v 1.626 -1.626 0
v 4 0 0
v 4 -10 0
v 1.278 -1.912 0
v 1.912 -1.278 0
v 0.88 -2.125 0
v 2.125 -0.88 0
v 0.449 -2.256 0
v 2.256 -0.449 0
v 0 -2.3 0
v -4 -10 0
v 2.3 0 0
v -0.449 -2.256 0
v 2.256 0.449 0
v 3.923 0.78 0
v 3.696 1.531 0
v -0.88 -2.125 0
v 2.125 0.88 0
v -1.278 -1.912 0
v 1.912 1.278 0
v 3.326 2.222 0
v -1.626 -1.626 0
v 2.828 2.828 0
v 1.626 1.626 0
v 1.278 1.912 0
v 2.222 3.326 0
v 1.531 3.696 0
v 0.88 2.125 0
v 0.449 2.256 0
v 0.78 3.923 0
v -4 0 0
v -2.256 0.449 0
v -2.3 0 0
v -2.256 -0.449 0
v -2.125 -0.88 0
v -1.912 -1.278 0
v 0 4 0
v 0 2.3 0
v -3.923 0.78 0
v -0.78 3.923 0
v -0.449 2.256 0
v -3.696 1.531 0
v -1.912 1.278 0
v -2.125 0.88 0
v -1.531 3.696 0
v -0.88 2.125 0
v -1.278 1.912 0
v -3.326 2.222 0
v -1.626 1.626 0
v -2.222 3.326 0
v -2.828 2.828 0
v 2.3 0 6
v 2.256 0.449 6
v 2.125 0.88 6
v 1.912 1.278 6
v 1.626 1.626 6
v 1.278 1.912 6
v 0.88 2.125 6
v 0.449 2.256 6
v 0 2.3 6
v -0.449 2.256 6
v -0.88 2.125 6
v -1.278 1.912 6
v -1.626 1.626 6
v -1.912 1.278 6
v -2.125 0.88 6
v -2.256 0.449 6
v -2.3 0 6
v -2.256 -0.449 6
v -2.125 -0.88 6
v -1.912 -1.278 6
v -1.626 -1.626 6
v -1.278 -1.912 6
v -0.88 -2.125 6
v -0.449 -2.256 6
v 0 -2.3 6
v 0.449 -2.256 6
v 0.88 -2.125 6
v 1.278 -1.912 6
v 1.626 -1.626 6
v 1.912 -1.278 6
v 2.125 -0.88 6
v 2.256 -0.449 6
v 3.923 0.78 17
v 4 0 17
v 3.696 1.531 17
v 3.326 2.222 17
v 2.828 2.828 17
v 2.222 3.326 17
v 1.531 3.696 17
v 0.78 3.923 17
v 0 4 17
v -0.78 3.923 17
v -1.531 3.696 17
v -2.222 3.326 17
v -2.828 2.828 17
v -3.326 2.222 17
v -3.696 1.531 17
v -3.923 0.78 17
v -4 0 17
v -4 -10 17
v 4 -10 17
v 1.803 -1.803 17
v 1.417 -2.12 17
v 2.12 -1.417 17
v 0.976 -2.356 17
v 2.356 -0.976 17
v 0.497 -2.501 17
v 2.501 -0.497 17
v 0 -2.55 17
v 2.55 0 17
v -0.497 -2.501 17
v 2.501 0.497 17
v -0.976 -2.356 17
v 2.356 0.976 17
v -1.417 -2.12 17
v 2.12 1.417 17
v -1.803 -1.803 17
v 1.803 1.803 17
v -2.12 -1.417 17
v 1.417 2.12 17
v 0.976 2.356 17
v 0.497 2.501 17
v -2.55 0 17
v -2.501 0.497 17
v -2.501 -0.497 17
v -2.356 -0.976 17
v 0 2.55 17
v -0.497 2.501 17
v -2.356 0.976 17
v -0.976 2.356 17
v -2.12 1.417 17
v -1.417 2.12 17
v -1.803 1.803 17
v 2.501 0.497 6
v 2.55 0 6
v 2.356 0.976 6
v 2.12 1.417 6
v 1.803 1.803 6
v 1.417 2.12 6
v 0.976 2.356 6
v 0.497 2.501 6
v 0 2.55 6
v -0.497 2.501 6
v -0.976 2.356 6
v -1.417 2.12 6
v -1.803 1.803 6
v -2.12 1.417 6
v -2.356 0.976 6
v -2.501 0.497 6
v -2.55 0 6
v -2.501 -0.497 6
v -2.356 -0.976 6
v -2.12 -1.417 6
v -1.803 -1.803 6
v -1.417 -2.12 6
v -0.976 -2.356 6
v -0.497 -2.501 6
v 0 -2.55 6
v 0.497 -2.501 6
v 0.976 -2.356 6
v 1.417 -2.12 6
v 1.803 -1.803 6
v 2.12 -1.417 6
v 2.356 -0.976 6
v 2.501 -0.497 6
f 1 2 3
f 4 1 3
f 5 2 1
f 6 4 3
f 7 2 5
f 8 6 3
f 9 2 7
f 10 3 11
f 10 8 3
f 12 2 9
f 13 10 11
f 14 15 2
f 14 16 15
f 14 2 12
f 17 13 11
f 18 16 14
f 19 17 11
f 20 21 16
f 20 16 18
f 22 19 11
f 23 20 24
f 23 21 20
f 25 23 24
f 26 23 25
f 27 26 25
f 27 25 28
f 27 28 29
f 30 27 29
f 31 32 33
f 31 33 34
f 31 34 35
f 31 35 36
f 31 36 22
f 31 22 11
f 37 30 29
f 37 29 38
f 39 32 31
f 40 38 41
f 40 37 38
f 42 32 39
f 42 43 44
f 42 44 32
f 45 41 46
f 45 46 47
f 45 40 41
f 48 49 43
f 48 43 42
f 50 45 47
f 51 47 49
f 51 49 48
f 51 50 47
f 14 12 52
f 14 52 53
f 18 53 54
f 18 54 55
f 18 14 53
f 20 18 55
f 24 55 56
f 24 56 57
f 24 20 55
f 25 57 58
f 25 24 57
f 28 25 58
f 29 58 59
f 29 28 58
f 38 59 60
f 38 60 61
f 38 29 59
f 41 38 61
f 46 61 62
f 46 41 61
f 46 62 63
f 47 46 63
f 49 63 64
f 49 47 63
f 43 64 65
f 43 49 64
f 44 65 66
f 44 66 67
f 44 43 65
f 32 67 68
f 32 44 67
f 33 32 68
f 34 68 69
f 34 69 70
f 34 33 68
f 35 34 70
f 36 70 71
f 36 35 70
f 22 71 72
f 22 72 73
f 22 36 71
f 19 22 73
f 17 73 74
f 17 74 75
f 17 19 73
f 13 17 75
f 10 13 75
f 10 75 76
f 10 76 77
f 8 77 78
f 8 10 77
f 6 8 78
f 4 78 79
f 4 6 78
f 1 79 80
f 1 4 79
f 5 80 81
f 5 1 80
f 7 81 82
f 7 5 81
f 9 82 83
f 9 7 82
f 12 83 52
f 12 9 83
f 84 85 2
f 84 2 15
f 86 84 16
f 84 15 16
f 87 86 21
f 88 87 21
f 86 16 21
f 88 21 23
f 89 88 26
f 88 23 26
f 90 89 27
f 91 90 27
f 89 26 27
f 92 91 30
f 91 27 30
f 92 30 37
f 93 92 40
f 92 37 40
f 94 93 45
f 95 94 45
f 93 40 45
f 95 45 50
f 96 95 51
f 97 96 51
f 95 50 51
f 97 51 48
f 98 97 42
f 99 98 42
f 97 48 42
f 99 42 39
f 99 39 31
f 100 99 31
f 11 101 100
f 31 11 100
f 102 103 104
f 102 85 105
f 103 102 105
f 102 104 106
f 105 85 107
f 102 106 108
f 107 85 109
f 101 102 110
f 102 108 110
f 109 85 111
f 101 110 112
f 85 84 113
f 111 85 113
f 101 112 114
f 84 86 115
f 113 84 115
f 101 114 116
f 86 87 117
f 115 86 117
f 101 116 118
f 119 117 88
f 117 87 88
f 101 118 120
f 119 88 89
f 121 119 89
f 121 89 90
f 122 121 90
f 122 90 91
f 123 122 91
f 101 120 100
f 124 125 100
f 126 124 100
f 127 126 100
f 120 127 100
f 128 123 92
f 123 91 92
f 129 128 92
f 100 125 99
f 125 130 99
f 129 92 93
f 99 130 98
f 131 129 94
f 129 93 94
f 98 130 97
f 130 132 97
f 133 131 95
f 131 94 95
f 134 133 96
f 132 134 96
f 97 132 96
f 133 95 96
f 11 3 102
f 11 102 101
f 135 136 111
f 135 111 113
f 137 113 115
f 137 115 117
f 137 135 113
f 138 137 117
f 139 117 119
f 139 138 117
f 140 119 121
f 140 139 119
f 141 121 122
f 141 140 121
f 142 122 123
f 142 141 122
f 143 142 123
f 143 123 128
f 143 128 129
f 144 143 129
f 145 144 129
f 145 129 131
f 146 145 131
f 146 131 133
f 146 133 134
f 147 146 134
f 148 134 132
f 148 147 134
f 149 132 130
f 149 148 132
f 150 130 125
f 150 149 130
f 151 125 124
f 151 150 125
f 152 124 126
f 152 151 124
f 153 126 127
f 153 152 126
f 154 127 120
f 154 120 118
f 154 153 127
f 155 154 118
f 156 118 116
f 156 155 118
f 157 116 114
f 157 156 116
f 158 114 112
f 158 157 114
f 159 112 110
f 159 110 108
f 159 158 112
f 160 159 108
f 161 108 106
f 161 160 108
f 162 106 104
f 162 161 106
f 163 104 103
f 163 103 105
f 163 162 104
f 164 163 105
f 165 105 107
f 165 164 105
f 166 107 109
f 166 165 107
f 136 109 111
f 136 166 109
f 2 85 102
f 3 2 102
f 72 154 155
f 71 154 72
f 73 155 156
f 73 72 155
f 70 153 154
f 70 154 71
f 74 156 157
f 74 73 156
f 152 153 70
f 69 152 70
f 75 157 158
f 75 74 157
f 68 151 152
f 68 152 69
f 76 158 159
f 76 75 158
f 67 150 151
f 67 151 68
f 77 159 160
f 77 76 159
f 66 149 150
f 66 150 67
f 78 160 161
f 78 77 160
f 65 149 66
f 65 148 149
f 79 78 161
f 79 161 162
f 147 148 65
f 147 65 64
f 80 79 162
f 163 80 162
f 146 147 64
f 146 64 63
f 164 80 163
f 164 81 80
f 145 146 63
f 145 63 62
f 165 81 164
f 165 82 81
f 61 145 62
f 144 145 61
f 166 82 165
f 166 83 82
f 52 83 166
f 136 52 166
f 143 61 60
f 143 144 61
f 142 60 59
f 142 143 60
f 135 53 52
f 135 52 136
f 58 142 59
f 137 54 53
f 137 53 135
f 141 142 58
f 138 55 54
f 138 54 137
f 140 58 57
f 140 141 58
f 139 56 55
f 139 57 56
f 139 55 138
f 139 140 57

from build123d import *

# Parameters (mm, degrees)
SKETCH1_R           = 4
SKETCH1_R_2         = 2.3
BOSS_EXTRUDE1_DEPTH = 6
SKETCH2_R           = 4
SKETCH2_R_2         = 2.55
BOSS_EXTRUDE2_DEPTH = 11
SKETCH3_R           = 2.55
BOSS_EXTRUDE3_DEPTH = 17


with BuildPart() as part:
    # Sketch1 → Boss-Extrude1 (new body)
    with BuildSketch(Plane.XY):
        Circle(SKETCH1_R)
        Circle(SKETCH1_R_2, mode=Mode.SUBTRACT)
    extrude(amount=BOSS_EXTRUDE1_DEPTH)

    # Sketch2 → Boss-Extrude2 (add)
    with BuildSketch(Plane.XY.offset(6)):
        Circle(SKETCH2_R)
        Circle(SKETCH2_R_2, mode=Mode.SUBTRACT)
    extrude(amount=BOSS_EXTRUDE2_DEPTH)

    # Sketch3 → Boss-Extrude3 (add)
    with BuildSketch(Plane(origin=(0, 0, 0), x_dir=(-1, 0, 0), z_dir=(0, 0, -1))):
        with BuildLine():
            Line((-4, 0), (-4, -10))
            Line((-4, -10), (4, -10))
            Line((4, -10), (4, 0))
            ThreePointArc((4, 0), (0, 4), (-4, 0))
        make_face()
        with Locations(Location((0, 0, 0), (0, 0, 180))):
            Circle(SKETCH3_R, mode=Mode.SUBTRACT)
    extrude(amount=-BOSS_EXTRUDE3_DEPTH)


solid = part.part
